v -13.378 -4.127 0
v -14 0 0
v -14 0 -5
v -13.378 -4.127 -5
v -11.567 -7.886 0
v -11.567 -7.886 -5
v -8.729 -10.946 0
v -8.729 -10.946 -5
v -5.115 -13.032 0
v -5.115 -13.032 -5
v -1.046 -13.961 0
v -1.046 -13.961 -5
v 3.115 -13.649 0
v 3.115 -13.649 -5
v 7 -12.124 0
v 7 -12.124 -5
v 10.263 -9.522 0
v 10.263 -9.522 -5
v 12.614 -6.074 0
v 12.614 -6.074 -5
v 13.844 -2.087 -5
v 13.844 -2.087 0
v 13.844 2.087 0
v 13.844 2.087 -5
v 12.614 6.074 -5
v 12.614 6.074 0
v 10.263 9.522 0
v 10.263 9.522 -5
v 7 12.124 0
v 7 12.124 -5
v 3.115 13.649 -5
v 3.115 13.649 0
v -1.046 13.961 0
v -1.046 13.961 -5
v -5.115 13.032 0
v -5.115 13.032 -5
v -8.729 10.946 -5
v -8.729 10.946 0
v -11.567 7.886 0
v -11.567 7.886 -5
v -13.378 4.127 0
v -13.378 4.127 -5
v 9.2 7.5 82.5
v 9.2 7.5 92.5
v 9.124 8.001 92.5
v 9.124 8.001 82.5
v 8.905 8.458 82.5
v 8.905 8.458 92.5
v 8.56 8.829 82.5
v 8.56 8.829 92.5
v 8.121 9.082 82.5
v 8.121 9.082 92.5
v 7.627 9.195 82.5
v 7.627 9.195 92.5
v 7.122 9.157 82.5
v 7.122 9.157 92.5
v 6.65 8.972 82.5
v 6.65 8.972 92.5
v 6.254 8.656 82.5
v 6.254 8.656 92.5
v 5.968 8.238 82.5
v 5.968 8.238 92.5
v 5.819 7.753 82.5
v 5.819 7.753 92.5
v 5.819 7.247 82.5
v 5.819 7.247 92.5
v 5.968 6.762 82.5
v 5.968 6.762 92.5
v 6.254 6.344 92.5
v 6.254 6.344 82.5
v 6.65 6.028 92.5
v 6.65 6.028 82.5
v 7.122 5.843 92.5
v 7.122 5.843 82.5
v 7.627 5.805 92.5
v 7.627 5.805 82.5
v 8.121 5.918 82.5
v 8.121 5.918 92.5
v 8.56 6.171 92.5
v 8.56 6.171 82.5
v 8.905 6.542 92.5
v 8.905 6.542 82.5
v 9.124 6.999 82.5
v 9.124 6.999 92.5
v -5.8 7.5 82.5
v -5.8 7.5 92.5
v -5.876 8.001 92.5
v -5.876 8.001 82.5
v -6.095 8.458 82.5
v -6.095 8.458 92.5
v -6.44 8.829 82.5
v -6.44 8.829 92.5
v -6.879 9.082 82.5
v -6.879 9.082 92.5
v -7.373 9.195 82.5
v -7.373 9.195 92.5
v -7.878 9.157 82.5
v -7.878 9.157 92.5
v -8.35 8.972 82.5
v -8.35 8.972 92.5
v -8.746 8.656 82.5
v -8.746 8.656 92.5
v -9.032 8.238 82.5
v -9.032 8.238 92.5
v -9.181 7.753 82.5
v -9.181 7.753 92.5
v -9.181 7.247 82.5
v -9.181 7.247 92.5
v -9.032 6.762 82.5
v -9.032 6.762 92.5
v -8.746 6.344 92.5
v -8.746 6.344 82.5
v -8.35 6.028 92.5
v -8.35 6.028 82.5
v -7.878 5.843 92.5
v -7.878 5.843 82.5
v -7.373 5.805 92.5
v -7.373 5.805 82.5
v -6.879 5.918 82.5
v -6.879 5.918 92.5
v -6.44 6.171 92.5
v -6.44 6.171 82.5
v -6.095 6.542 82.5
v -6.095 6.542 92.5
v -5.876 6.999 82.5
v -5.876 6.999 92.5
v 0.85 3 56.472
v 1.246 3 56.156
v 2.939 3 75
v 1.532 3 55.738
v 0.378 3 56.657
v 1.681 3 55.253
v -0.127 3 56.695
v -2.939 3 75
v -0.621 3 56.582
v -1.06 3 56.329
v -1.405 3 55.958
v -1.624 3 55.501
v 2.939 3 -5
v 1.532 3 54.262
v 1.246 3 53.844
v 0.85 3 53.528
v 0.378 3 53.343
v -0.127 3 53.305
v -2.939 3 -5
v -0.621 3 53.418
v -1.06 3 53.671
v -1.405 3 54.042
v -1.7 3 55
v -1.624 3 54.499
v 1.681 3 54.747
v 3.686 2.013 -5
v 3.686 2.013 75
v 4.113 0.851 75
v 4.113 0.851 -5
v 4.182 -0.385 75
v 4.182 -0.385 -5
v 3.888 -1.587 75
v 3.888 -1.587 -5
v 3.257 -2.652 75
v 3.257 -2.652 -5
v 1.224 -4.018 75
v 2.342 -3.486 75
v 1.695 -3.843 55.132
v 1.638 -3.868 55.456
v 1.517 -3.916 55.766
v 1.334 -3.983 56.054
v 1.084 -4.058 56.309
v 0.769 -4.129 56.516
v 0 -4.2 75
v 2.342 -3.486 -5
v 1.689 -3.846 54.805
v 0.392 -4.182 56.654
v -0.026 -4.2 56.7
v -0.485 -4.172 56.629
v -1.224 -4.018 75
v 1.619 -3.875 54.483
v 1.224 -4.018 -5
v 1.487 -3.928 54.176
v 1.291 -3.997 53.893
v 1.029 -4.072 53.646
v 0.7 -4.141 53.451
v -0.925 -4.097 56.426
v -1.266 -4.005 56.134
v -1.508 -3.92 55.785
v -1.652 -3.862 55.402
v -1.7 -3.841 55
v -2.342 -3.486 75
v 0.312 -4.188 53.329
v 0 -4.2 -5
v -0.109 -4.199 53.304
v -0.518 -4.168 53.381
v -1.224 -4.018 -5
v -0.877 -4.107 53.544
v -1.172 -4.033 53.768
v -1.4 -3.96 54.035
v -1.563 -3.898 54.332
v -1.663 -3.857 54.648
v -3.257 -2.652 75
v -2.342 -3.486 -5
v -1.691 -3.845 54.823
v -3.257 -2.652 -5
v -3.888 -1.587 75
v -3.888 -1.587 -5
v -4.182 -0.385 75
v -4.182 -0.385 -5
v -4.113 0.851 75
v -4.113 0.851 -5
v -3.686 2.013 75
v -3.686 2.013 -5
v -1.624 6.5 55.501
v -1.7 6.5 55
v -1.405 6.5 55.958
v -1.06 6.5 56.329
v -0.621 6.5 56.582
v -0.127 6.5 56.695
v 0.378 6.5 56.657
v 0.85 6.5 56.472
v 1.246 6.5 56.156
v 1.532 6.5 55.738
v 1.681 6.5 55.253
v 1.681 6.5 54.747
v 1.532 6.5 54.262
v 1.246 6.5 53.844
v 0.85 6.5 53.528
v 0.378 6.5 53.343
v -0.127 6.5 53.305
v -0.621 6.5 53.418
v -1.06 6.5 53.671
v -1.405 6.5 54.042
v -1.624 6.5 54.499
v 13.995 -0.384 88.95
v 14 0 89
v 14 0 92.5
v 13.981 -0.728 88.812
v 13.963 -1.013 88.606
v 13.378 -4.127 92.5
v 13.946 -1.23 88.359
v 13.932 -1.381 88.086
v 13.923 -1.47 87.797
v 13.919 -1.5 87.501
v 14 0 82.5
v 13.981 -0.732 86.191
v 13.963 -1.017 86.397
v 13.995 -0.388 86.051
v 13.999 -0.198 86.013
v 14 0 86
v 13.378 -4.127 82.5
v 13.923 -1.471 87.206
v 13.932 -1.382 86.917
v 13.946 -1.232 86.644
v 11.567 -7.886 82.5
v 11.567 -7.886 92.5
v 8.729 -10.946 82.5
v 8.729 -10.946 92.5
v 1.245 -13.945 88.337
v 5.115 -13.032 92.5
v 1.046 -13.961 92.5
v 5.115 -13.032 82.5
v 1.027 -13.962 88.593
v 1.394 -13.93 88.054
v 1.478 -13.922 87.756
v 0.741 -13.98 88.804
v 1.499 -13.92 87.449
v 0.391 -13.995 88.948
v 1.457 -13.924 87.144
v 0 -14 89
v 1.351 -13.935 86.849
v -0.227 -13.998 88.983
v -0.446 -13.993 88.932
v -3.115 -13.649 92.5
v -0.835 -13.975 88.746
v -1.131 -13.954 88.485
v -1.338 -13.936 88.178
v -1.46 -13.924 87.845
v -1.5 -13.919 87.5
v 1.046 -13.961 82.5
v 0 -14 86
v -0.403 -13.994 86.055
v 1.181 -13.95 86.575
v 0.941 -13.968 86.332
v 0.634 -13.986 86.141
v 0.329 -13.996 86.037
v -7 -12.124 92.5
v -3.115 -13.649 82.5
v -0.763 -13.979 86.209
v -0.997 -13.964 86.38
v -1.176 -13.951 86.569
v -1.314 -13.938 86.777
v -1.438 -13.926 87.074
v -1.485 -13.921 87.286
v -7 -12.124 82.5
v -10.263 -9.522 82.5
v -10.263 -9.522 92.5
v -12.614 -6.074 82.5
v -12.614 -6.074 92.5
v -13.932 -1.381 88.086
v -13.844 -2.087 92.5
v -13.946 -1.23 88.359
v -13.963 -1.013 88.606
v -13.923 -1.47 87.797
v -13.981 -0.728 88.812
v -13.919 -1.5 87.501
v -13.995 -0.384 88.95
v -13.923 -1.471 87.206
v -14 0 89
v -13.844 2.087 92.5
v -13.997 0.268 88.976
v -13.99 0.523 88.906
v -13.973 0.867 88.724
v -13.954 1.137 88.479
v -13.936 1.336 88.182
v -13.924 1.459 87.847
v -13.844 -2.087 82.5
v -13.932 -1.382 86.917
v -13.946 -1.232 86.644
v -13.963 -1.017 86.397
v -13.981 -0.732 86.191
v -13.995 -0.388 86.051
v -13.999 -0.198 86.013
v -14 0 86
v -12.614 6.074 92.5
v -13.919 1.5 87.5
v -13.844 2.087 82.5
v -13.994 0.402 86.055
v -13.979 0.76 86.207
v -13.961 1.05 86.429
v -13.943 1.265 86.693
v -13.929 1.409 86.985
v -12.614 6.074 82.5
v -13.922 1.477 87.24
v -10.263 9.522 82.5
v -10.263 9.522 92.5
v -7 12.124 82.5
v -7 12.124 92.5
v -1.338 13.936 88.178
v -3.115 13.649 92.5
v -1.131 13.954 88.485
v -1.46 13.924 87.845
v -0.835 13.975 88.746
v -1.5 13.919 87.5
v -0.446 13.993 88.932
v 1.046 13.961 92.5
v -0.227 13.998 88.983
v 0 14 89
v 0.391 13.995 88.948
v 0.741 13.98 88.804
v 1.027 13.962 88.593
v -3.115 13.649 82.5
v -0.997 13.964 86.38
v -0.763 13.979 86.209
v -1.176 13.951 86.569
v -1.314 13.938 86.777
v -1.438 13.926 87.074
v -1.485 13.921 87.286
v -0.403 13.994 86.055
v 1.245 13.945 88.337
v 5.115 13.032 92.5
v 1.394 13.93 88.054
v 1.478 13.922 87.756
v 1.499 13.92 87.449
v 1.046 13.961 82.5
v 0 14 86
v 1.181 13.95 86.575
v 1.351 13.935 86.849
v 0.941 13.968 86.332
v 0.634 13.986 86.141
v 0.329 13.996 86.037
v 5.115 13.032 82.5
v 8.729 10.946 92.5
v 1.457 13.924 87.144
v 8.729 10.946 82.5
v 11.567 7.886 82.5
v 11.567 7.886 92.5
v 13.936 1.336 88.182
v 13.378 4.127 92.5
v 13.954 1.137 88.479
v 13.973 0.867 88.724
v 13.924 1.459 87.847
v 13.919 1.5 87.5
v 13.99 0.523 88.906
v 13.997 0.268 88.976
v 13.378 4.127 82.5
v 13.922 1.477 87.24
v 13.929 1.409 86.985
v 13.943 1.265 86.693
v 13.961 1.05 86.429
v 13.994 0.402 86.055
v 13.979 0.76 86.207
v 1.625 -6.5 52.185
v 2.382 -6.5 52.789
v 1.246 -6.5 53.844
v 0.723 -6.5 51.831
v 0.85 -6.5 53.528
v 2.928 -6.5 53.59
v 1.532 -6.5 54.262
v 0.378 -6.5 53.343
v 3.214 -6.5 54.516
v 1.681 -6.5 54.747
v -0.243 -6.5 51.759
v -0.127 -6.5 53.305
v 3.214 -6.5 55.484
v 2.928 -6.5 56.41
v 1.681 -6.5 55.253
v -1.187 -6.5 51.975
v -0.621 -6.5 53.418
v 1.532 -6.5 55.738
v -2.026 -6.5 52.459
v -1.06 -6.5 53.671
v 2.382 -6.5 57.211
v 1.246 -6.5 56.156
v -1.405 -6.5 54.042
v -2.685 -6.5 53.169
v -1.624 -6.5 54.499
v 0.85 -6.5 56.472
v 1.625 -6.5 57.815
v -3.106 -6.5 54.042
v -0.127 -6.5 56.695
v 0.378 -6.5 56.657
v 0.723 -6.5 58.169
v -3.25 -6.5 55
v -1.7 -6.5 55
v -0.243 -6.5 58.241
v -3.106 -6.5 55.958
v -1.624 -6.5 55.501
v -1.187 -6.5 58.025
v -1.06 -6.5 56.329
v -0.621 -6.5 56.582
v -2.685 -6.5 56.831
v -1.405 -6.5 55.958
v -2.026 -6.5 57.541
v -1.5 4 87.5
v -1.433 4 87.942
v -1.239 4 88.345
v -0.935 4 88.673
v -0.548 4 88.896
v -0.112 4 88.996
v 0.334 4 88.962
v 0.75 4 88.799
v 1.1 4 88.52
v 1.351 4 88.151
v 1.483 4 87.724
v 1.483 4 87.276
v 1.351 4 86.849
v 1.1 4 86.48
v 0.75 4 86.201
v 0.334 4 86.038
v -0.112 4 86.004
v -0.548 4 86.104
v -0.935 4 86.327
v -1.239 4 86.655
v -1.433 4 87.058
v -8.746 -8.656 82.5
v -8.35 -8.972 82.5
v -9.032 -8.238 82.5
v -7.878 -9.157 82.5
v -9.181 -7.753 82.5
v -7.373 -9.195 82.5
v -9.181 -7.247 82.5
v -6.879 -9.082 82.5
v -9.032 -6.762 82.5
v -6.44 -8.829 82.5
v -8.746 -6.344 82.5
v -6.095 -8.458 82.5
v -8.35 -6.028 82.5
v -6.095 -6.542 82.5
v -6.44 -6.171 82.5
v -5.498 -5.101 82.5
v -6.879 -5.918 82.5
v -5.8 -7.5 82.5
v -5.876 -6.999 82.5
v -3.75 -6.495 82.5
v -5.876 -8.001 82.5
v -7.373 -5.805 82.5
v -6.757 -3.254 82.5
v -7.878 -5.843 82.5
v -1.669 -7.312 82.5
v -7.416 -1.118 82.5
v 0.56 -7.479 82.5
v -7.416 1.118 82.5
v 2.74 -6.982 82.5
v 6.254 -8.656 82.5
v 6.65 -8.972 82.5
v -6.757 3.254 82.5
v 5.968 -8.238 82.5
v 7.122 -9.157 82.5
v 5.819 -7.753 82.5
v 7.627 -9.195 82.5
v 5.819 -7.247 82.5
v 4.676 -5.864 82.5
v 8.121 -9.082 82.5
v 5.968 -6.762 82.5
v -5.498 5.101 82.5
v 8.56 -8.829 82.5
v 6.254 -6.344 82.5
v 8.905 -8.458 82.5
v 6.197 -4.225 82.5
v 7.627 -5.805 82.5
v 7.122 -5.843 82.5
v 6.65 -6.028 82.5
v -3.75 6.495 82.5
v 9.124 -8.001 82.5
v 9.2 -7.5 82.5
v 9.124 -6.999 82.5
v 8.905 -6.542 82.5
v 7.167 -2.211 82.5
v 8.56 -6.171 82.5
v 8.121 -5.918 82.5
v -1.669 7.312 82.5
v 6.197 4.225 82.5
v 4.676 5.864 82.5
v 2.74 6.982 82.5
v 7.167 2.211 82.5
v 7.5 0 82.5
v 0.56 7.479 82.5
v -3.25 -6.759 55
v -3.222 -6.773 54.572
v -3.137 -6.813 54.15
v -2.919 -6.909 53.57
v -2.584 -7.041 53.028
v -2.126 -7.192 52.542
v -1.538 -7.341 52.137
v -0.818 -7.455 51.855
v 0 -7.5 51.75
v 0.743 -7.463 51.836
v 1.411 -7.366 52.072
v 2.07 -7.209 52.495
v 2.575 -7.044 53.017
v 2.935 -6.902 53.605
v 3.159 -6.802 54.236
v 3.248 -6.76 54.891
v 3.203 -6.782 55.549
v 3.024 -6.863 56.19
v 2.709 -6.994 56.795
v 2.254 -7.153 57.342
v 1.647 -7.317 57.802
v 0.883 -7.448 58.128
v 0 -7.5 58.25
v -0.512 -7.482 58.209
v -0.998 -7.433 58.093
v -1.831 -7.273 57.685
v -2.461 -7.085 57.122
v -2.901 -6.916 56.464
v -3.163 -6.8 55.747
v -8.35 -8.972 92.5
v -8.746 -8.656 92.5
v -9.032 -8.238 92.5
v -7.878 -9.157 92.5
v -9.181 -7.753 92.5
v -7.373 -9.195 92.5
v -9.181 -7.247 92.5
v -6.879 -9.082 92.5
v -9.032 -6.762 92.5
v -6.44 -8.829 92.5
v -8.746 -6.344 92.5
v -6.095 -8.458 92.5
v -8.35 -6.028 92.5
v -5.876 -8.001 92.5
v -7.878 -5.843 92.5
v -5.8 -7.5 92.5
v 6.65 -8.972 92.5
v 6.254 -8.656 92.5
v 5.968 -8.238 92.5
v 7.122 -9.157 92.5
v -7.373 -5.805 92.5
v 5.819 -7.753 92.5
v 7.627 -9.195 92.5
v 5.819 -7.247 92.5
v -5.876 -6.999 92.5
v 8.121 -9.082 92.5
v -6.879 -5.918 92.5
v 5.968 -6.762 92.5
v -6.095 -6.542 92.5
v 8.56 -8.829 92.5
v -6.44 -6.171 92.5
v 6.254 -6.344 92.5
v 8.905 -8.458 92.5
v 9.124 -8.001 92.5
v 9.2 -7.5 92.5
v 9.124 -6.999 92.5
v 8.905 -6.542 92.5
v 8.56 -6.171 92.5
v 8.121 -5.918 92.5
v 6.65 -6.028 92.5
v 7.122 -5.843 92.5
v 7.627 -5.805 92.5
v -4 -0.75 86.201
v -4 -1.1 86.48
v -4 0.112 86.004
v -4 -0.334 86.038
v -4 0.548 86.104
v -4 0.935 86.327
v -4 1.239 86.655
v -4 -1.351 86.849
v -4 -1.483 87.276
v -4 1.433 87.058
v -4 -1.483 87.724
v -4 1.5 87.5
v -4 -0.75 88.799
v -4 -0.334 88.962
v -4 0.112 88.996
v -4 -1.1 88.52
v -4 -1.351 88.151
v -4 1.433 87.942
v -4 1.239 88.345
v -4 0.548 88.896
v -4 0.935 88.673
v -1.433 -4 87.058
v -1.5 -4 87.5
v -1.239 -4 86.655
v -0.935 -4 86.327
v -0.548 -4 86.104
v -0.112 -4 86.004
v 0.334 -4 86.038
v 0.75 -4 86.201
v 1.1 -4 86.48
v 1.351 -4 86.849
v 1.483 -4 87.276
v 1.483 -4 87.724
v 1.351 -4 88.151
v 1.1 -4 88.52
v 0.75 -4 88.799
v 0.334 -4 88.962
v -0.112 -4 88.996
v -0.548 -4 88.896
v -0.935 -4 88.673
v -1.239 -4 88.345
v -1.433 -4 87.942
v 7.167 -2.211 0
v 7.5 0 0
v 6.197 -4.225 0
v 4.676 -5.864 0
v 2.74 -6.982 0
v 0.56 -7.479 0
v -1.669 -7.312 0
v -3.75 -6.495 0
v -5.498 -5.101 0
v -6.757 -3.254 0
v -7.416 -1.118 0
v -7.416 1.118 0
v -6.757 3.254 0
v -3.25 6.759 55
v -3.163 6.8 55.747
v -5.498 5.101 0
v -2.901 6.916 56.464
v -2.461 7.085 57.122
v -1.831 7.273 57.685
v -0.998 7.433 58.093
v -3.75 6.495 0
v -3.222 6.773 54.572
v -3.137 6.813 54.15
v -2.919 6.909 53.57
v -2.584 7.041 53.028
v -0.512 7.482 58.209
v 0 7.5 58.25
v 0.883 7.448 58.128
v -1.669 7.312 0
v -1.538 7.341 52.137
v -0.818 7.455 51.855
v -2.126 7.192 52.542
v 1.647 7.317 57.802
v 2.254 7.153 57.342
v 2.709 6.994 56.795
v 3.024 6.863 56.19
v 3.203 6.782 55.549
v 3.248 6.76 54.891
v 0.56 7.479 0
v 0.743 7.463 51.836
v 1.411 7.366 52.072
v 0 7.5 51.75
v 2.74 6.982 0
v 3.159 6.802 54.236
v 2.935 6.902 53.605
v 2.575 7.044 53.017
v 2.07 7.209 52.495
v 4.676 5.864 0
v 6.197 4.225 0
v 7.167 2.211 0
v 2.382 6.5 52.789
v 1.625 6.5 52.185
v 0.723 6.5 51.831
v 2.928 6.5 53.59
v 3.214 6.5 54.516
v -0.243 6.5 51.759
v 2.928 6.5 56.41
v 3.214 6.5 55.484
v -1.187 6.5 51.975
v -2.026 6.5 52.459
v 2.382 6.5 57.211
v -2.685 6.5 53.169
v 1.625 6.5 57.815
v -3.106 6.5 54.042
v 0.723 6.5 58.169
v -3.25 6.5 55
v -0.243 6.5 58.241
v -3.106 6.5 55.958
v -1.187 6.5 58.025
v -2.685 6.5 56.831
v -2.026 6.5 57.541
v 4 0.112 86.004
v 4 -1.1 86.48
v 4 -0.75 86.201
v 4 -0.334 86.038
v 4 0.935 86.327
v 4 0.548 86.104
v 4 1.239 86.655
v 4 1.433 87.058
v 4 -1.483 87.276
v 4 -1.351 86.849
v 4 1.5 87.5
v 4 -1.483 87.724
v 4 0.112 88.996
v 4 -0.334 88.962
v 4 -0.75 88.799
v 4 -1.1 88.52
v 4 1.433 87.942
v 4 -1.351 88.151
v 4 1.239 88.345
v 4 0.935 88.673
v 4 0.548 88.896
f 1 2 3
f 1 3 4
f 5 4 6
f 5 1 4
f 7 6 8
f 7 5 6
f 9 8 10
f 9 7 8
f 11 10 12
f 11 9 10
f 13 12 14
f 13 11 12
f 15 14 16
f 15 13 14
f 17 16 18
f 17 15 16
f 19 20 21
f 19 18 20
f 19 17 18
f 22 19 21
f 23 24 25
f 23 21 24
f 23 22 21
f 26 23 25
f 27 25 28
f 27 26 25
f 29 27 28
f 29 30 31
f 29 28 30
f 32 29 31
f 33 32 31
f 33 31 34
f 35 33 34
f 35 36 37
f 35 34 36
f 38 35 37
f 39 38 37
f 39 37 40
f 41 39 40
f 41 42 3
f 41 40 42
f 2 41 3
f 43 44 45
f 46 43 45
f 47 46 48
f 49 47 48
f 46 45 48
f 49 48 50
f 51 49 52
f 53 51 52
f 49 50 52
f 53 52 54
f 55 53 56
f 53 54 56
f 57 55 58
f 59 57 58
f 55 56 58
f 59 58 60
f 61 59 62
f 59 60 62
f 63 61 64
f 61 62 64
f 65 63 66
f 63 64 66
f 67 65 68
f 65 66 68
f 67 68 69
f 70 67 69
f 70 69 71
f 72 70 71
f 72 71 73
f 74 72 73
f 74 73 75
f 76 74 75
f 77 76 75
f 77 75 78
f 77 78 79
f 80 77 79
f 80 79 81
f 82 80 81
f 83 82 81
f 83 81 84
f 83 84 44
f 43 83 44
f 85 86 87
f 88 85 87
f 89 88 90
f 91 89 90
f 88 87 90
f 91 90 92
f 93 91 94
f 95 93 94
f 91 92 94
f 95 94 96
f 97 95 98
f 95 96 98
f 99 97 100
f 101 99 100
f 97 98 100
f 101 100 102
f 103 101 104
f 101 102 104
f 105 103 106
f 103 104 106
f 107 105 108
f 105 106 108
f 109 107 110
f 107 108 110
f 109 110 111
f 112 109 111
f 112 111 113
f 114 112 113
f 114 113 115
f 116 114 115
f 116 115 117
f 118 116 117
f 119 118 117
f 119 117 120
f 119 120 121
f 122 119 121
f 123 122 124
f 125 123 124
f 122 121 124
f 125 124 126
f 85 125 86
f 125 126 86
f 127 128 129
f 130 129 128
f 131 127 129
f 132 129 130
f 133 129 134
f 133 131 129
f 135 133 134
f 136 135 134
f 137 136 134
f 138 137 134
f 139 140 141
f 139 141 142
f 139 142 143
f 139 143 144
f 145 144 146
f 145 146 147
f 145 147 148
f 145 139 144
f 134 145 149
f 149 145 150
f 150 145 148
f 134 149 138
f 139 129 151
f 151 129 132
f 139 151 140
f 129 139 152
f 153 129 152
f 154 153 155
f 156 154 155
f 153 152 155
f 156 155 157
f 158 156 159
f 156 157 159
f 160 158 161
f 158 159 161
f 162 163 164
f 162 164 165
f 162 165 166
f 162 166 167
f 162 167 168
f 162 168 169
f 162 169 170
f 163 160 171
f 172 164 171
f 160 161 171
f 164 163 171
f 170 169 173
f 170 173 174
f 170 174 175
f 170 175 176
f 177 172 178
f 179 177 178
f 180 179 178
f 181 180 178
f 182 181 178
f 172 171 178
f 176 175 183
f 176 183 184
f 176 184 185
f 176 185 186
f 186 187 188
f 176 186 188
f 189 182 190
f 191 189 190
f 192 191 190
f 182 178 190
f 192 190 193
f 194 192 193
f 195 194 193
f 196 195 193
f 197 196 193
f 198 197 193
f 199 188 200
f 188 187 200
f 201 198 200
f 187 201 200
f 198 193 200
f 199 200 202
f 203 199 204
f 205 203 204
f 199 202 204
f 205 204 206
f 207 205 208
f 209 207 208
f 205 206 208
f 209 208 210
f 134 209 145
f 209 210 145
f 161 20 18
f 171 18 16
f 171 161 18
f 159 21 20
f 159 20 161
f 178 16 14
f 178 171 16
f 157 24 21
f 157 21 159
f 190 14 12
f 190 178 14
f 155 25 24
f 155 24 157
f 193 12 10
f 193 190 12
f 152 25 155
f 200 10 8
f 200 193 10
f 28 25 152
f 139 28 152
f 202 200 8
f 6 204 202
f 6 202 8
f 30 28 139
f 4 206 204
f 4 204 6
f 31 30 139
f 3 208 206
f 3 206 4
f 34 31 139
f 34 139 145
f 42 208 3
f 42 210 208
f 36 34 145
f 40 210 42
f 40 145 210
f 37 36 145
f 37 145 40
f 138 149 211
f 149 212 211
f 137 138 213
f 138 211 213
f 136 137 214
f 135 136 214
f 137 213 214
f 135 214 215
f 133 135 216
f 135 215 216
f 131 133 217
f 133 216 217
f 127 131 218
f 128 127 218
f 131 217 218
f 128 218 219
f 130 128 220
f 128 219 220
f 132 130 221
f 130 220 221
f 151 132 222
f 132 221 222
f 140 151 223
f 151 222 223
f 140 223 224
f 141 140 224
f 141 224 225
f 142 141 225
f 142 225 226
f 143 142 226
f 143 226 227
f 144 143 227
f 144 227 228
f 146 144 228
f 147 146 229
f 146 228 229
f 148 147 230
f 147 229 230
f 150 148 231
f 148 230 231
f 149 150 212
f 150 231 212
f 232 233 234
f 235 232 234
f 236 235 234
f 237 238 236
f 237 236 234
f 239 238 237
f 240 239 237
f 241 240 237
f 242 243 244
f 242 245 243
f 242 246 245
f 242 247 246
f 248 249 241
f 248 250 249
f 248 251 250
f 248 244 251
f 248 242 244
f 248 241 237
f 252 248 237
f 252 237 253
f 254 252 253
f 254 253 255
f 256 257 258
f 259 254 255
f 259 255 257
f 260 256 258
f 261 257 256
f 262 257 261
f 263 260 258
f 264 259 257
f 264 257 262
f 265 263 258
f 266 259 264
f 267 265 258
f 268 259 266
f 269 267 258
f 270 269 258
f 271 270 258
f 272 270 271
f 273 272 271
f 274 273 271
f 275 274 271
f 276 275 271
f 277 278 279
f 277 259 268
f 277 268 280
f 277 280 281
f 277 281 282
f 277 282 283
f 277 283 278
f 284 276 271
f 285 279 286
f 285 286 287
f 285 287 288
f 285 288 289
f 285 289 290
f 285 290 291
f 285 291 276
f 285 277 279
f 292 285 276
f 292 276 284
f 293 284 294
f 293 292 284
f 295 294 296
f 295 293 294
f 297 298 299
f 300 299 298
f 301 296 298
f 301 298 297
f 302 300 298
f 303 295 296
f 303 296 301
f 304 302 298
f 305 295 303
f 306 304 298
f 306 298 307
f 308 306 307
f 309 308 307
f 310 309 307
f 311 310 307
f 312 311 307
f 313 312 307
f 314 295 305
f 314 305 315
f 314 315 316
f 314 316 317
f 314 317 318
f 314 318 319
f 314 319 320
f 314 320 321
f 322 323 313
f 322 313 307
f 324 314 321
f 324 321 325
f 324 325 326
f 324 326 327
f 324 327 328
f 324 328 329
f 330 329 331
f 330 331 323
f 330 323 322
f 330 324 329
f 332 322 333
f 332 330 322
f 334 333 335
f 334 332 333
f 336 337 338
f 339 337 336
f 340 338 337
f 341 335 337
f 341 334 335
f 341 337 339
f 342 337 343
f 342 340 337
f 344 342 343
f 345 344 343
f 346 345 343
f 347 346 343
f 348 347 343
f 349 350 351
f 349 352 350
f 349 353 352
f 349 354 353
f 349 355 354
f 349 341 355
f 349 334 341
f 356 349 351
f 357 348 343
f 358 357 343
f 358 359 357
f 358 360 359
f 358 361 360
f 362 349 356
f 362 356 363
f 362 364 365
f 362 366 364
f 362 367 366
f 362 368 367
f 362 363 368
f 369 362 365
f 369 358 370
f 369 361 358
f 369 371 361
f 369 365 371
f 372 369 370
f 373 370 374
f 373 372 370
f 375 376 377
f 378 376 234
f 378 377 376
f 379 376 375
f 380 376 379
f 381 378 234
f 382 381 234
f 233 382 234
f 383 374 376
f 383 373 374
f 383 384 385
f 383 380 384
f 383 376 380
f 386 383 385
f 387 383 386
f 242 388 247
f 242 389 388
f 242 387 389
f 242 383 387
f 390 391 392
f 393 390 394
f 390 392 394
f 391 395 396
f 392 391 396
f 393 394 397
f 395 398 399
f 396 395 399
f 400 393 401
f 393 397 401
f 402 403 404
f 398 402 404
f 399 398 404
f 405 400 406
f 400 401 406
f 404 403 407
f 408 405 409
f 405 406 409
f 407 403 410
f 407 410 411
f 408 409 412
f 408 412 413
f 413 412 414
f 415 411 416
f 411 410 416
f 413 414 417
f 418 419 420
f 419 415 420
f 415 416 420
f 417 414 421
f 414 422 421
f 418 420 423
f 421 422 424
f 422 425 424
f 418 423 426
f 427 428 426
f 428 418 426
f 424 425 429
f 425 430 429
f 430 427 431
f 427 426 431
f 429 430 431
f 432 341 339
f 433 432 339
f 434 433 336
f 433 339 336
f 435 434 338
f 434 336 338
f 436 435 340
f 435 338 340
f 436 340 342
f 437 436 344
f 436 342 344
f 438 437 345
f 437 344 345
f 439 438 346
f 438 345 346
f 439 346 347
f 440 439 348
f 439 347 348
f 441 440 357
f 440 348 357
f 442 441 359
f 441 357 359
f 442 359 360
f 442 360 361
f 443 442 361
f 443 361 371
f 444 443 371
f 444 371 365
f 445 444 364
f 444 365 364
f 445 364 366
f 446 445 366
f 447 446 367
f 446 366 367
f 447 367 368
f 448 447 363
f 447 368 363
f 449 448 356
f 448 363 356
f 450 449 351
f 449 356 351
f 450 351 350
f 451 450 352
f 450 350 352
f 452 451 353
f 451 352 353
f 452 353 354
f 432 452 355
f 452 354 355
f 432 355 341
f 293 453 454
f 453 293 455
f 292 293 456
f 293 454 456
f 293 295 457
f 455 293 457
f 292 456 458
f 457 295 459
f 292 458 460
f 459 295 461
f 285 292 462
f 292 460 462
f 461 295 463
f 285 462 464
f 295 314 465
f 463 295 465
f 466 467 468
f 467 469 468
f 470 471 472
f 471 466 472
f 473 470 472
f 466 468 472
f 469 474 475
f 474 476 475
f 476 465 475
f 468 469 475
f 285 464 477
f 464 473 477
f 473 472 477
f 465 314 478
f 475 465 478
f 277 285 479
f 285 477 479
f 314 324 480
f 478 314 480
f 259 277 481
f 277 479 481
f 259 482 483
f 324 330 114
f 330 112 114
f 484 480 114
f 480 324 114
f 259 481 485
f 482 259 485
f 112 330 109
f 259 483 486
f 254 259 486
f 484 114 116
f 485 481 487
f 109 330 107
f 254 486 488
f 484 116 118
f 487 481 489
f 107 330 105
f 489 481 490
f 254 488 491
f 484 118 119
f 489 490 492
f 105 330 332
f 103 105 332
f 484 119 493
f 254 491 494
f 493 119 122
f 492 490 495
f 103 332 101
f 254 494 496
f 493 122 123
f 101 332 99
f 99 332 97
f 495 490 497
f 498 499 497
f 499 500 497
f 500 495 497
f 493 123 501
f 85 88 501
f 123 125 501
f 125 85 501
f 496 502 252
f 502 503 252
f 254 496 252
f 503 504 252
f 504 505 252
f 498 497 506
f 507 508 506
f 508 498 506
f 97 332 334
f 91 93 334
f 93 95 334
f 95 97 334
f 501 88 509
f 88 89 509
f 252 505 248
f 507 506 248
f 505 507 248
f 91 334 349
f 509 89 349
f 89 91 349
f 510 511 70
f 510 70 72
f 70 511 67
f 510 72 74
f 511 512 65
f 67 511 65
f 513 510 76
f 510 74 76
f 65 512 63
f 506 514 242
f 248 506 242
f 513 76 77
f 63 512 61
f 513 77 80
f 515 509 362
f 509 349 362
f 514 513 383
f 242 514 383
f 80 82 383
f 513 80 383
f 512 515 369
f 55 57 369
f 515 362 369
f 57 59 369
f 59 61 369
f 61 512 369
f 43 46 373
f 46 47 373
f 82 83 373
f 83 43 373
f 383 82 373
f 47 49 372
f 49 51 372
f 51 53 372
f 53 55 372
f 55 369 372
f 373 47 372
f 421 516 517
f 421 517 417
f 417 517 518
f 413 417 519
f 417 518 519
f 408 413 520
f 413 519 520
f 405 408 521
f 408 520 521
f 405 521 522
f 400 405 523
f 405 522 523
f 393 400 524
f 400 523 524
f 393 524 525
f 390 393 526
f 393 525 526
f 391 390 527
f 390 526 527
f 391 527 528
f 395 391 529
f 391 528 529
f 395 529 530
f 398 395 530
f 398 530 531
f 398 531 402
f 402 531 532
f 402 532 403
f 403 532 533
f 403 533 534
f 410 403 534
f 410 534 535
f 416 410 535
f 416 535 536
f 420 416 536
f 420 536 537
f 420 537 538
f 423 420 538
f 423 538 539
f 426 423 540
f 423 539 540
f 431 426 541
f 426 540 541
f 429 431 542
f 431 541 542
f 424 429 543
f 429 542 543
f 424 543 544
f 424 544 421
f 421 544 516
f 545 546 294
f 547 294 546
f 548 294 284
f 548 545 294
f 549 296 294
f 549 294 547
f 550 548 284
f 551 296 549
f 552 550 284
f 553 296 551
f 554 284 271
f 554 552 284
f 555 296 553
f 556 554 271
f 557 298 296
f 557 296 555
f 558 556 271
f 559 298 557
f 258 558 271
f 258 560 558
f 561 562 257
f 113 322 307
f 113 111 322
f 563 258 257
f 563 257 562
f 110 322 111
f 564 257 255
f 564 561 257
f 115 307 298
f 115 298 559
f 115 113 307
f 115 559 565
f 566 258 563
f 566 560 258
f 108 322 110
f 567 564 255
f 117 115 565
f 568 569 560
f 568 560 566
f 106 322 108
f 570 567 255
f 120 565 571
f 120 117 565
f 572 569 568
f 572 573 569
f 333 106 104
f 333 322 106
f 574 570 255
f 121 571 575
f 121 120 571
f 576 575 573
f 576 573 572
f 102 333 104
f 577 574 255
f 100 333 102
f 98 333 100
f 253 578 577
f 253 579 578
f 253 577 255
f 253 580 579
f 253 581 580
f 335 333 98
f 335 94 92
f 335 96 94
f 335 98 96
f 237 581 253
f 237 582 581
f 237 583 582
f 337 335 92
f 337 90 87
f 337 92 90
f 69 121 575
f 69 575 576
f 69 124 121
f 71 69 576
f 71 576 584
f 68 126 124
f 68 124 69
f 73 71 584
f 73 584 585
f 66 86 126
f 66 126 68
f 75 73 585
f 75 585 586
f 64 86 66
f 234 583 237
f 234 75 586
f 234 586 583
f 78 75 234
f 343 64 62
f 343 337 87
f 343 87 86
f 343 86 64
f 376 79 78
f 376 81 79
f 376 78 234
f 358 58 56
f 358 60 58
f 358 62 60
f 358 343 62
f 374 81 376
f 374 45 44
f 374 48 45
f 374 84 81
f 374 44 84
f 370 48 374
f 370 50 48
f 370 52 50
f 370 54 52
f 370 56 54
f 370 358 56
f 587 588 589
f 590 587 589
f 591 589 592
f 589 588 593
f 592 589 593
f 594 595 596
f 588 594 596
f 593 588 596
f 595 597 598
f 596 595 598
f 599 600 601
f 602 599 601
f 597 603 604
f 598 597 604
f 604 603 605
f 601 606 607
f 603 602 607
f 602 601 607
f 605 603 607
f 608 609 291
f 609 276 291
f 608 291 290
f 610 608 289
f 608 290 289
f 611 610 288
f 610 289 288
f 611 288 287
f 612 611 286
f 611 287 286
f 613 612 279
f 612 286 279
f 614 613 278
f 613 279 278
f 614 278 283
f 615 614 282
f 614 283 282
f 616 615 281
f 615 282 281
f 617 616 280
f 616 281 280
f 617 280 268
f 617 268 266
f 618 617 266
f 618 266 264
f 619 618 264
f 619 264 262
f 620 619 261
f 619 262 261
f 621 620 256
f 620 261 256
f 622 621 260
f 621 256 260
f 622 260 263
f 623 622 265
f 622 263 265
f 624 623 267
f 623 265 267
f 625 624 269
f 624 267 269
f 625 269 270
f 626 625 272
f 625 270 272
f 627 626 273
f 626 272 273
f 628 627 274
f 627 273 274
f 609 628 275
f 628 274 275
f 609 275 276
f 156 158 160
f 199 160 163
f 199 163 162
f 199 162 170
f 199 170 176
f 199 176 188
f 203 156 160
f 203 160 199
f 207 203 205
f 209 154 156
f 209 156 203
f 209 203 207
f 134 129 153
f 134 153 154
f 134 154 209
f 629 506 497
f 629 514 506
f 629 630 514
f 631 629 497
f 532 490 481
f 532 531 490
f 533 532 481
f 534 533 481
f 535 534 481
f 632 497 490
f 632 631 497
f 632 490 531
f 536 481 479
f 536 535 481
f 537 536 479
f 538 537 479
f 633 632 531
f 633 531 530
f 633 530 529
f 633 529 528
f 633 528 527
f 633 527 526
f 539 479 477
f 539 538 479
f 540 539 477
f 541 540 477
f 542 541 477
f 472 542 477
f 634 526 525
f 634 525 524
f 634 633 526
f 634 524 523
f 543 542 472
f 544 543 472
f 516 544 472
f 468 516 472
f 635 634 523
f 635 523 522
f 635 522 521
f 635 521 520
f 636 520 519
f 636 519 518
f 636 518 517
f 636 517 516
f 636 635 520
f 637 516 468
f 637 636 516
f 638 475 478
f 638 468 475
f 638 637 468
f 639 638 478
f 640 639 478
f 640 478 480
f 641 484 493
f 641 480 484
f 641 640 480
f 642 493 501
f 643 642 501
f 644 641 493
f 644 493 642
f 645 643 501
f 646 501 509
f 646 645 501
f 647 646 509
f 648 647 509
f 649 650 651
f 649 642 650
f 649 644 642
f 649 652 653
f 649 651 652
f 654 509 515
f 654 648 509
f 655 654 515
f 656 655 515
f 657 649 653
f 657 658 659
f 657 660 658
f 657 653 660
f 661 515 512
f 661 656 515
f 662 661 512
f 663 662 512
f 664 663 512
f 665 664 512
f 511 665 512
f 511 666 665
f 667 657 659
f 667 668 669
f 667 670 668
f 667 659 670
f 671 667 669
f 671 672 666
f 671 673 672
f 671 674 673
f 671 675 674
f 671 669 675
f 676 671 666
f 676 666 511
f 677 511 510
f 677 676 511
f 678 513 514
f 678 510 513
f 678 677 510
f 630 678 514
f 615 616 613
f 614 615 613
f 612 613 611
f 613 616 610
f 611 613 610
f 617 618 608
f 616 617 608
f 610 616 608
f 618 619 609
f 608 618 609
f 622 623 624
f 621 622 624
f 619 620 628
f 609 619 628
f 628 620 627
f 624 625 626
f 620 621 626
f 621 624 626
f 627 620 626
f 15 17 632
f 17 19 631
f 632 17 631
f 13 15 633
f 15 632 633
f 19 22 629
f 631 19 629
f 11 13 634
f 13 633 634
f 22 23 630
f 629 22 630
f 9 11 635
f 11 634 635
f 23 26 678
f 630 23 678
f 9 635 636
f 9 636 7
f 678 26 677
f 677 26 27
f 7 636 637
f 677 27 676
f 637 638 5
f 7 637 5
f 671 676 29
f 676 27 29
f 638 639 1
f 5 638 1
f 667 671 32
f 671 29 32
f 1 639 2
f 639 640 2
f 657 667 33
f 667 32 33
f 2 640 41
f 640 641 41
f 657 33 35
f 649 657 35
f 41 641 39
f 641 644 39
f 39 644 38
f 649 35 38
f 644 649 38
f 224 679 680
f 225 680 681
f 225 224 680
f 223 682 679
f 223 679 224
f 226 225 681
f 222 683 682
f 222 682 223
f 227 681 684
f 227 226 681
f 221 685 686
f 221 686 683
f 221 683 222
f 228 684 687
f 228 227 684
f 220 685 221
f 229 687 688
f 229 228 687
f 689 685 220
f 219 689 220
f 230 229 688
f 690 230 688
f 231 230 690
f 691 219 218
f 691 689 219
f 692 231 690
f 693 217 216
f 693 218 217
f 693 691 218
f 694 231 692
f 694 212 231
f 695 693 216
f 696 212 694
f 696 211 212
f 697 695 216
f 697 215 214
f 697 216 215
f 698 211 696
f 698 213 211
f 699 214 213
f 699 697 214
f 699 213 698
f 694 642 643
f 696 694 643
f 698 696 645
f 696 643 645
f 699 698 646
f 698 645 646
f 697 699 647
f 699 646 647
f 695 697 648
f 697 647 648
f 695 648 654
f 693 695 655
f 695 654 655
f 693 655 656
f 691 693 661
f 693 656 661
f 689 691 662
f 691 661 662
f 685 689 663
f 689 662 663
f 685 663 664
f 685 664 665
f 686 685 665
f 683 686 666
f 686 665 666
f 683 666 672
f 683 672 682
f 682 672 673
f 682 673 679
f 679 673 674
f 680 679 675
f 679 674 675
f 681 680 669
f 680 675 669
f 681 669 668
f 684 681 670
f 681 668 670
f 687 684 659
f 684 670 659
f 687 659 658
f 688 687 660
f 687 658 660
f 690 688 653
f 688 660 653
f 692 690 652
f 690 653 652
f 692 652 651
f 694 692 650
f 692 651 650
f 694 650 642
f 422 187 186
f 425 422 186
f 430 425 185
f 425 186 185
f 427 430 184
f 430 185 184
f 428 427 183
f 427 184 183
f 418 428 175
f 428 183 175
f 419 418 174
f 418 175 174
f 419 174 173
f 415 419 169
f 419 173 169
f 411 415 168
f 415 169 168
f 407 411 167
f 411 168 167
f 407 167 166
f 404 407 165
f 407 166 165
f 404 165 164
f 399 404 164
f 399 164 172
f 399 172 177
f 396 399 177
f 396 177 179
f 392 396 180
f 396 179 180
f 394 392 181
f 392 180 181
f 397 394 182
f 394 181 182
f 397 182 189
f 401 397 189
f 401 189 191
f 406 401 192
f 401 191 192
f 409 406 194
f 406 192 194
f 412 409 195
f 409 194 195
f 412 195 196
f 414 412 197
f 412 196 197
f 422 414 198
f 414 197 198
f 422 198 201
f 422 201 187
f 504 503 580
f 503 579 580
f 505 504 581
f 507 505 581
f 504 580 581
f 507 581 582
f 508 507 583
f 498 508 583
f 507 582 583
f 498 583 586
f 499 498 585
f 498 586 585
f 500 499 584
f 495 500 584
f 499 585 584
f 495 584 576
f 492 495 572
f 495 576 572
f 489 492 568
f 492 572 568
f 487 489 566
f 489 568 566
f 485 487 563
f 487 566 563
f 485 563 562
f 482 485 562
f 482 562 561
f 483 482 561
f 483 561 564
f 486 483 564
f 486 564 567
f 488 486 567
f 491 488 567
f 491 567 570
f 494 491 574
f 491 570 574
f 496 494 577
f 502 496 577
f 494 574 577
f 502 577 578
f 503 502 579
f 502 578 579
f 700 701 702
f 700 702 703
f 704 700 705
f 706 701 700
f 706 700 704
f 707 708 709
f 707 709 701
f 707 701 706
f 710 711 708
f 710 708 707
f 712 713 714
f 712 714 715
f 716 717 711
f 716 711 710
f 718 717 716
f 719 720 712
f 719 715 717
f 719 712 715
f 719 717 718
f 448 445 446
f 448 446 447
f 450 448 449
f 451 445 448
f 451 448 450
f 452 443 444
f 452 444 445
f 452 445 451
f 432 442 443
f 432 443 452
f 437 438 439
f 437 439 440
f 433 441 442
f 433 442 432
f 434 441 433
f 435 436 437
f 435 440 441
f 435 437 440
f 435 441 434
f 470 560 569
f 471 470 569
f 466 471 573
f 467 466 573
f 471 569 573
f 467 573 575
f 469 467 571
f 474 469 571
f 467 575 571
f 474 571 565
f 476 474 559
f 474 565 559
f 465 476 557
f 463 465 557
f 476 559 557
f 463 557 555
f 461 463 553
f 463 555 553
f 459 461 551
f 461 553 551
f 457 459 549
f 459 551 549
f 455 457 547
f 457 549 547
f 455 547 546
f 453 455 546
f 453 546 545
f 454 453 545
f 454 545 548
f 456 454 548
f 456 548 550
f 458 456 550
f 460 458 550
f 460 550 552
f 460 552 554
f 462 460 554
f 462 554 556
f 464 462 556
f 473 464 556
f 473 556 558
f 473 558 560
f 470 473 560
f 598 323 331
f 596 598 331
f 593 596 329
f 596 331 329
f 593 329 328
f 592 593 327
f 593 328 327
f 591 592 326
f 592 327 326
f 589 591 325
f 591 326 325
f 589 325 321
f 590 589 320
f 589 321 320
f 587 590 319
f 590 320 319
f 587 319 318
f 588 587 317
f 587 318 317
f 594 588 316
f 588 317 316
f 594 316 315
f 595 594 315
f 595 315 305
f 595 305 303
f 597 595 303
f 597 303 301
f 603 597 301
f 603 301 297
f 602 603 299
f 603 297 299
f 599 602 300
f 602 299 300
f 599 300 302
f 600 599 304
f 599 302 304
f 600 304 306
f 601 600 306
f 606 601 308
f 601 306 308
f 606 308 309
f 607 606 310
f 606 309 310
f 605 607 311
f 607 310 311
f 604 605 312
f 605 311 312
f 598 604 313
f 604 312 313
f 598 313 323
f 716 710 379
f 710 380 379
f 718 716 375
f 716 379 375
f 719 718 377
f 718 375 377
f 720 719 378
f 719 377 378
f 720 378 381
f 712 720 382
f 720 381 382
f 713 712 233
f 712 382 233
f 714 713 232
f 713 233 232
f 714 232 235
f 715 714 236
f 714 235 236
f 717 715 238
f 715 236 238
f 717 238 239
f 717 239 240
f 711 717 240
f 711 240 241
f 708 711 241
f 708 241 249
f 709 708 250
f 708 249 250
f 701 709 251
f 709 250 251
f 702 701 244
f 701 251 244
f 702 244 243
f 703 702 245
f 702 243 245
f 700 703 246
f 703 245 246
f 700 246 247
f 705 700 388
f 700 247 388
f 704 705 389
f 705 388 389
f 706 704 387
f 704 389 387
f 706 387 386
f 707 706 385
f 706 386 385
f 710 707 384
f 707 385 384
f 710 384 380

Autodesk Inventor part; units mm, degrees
sketch "スケッチ1" plane through (0, 0, 0) normal (0, 0, 1) x (1, 0, 0)
  circle A0 centre (0, 0) radius 7.5
  dimension "d0" = 15
extrude "押し出し1" add sketch "スケッチ1" along normal blind 82.5
ref_plane "作業平面1" through (14, 0, 0) normal (1, 0, 0) x (0, 1, 0)
ref_plane "作業平面2" through (-14, 0, 0) normal (1, 0, 0) x (0, 1, 0)
ref_plane "作業平面3" through (0, 7.5, 0) normal (0, 1, 0) x (-1, 0, 0)
ref_plane "作業平面4" through (0, -7.5, 0) normal (0, 1, 0) x (-1, 0, 0)
sketch "スケッチ7" plane through (0, 7.5, 0) normal (0, 1, 0) x (-1, 0, 0)
  circle A0 centre (0, 55) radius 1.7
  line L0 (7.5, 82.5) -> (-7.5, 82.5) projected
  point P0 (0, 0)
  dimension "d35" = 3.4
  dimension "d87" = 27.5
extrude "押し出し7" cut sketch "スケッチ7" against normal through all
sketch "スケッチ8" plane through (0, 7.5, 0) normal (0, 1, 0) x (-1, 0, 0)
  circle A0 centre (0, 55) radius 3.25
  line L0 (7.5, 82.5) -> (-7.5, 82.5) projected
  point P0 (0, 0)
  dimension "d39" = 6.5
  dimension "d85" = 27.5
sketch "スケッチ9" plane through (0, -7.5, 0) normal (0, 1, 0) x (-1, 0, 0)
  circle A0 centre (0, 55) radius 3.25
  line L0 (7.5, 82.5) -> (-7.5, 82.5) projected
  point P0 (0, 0)
  dimension "d41" = 6.5
  dimension "d86" = 27.5
extrude "押し出し8" cut sketch "スケッチ8" against normal blind 1
extrude "押し出し9" cut sketch "スケッチ9" along normal blind 1
sketch "スケッチ10" plane through (0, 0, 82.5) normal (0, 0, 1) x (1, 0, 0)
  circle A0 centre (0, 0) radius 14
  dimension "d47" = 28
extrude "押し出し10" add sketch "スケッチ10" along normal blind 10
ref_plane "作業平面5" through (0, 14, 0) normal (0, 1, 0) x (-1, 0, 0)
ref_plane "作業平面6" through (0, -14, 0) normal (0, 1, 0) x (-1, 0, 0)
sketch "スケッチ11" plane through (0, 14, 0) normal (0, 1, 0) x (-1, 0, 0)
  circle A0 centre (0, 87.5) radius 1.5
  line L0 (14, 92.5) -> (-14, 92.5) projected
  point P0 (0, 0)
  dimension "d52" = 3
  dimension "d53" = 5
sketch "スケッチ12" plane through (0, -14, 0) normal (0, 1, 0) x (-1, 0, 0)
  circle A0 centre (0, 87.5) radius 1.5
  line L0 (14, 92.5) -> (-14, 92.5) projected
  point P0 (0, 0)
  dimension "d54" = 3
  dimension "d55" = 5
sketch "スケッチ13" plane through (-14, 0, 0) normal (1, 0, 0) x (0, 1, 0)
  circle A0 centre (0, 87.5) radius 1.5
  line L0 (14, 92.5) -> (-14, 92.5) projected
  point P0 (0, 0)
  dimension "d56" = 3
  dimension "d57" = 5
sketch "スケッチ14" plane through (14, 0, 0) normal (1, 0, 0) x (0, 1, 0)
  circle A0 centre (0, 87.5) radius 1.5
  line L0 (14, 92.5) -> (-14, 92.5) projected
  point P0 (0, 0)
  dimension "d58" = 3
  dimension "d59" = 5
extrude "押し出し11" cut sketch "スケッチ11" against normal blind 10
extrude "押し出し12" cut sketch "スケッチ12" along normal blind 10
extrude "押し出し13" cut sketch "スケッチ14" against normal blind 10
extrude "押し出し14" cut sketch "スケッチ13" along normal blind 10
thread "ねじ5" size "M3x0.5" class "6H" standard "ANSI Metric M Profile" full length
thread "ねじ6" size "M3x0.5" class "6H" standard "ANSI Metric M Profile" full length
thread "ねじ7" size "M3x0.5" class "6H" standard "ANSI Metric M Profile" full length
thread "ねじ8" size "M3x0.5" class "6H" standard "ANSI Metric M Profile" full length
sketch "スケッチ15" plane through (0, 0, 92.5) normal (0, 0, 1) x (1, 0, 0)
  circle A0 centre (7.5, 7.5) radius 1.7
  circle A1 centre (-7.5, 7.5) radius 1.7
  circle A2 centre (-7.5, -7.5) radius 1.7
  circle A3 centre (7.5, -7.5) radius 1.7
  point P0 (0, 0)
  dimension "d76" = 3.4
  dimension "d77" = 7.5
  dimension "d78" = 7.5
  dimension "d81" = 360
extrude "押し出し15" cut sketch "スケッチ15" against normal through all
sketch "スケッチ16" plane through (0, 0, 0) normal (0, 0, -1) x (-1, 0, 0)
  circle A0 centre (0, 0) radius 14
  dimension "d88" = 28
extrude "押し出し16" add sketch "スケッチ16" along normal blind 5
sketch "スケッチ17" plane through (0, 0, -5) normal (0, 0, -1) x (-1, 0, 0)
  arc A0 (-2.9394, 3) -> (2.9394, 3) centre (0, 0) ccw
  line L0 (-2.9394, 3) -> (2.9394, 3)
  dimension "d91" = 4.2
  dimension "d92" = 3
extrude "押し出し17" cut sketch "スケッチ17" against normal blind 80
properties part number "rotary_transfer_shaft_5_2" material "ステンレス鋼"
